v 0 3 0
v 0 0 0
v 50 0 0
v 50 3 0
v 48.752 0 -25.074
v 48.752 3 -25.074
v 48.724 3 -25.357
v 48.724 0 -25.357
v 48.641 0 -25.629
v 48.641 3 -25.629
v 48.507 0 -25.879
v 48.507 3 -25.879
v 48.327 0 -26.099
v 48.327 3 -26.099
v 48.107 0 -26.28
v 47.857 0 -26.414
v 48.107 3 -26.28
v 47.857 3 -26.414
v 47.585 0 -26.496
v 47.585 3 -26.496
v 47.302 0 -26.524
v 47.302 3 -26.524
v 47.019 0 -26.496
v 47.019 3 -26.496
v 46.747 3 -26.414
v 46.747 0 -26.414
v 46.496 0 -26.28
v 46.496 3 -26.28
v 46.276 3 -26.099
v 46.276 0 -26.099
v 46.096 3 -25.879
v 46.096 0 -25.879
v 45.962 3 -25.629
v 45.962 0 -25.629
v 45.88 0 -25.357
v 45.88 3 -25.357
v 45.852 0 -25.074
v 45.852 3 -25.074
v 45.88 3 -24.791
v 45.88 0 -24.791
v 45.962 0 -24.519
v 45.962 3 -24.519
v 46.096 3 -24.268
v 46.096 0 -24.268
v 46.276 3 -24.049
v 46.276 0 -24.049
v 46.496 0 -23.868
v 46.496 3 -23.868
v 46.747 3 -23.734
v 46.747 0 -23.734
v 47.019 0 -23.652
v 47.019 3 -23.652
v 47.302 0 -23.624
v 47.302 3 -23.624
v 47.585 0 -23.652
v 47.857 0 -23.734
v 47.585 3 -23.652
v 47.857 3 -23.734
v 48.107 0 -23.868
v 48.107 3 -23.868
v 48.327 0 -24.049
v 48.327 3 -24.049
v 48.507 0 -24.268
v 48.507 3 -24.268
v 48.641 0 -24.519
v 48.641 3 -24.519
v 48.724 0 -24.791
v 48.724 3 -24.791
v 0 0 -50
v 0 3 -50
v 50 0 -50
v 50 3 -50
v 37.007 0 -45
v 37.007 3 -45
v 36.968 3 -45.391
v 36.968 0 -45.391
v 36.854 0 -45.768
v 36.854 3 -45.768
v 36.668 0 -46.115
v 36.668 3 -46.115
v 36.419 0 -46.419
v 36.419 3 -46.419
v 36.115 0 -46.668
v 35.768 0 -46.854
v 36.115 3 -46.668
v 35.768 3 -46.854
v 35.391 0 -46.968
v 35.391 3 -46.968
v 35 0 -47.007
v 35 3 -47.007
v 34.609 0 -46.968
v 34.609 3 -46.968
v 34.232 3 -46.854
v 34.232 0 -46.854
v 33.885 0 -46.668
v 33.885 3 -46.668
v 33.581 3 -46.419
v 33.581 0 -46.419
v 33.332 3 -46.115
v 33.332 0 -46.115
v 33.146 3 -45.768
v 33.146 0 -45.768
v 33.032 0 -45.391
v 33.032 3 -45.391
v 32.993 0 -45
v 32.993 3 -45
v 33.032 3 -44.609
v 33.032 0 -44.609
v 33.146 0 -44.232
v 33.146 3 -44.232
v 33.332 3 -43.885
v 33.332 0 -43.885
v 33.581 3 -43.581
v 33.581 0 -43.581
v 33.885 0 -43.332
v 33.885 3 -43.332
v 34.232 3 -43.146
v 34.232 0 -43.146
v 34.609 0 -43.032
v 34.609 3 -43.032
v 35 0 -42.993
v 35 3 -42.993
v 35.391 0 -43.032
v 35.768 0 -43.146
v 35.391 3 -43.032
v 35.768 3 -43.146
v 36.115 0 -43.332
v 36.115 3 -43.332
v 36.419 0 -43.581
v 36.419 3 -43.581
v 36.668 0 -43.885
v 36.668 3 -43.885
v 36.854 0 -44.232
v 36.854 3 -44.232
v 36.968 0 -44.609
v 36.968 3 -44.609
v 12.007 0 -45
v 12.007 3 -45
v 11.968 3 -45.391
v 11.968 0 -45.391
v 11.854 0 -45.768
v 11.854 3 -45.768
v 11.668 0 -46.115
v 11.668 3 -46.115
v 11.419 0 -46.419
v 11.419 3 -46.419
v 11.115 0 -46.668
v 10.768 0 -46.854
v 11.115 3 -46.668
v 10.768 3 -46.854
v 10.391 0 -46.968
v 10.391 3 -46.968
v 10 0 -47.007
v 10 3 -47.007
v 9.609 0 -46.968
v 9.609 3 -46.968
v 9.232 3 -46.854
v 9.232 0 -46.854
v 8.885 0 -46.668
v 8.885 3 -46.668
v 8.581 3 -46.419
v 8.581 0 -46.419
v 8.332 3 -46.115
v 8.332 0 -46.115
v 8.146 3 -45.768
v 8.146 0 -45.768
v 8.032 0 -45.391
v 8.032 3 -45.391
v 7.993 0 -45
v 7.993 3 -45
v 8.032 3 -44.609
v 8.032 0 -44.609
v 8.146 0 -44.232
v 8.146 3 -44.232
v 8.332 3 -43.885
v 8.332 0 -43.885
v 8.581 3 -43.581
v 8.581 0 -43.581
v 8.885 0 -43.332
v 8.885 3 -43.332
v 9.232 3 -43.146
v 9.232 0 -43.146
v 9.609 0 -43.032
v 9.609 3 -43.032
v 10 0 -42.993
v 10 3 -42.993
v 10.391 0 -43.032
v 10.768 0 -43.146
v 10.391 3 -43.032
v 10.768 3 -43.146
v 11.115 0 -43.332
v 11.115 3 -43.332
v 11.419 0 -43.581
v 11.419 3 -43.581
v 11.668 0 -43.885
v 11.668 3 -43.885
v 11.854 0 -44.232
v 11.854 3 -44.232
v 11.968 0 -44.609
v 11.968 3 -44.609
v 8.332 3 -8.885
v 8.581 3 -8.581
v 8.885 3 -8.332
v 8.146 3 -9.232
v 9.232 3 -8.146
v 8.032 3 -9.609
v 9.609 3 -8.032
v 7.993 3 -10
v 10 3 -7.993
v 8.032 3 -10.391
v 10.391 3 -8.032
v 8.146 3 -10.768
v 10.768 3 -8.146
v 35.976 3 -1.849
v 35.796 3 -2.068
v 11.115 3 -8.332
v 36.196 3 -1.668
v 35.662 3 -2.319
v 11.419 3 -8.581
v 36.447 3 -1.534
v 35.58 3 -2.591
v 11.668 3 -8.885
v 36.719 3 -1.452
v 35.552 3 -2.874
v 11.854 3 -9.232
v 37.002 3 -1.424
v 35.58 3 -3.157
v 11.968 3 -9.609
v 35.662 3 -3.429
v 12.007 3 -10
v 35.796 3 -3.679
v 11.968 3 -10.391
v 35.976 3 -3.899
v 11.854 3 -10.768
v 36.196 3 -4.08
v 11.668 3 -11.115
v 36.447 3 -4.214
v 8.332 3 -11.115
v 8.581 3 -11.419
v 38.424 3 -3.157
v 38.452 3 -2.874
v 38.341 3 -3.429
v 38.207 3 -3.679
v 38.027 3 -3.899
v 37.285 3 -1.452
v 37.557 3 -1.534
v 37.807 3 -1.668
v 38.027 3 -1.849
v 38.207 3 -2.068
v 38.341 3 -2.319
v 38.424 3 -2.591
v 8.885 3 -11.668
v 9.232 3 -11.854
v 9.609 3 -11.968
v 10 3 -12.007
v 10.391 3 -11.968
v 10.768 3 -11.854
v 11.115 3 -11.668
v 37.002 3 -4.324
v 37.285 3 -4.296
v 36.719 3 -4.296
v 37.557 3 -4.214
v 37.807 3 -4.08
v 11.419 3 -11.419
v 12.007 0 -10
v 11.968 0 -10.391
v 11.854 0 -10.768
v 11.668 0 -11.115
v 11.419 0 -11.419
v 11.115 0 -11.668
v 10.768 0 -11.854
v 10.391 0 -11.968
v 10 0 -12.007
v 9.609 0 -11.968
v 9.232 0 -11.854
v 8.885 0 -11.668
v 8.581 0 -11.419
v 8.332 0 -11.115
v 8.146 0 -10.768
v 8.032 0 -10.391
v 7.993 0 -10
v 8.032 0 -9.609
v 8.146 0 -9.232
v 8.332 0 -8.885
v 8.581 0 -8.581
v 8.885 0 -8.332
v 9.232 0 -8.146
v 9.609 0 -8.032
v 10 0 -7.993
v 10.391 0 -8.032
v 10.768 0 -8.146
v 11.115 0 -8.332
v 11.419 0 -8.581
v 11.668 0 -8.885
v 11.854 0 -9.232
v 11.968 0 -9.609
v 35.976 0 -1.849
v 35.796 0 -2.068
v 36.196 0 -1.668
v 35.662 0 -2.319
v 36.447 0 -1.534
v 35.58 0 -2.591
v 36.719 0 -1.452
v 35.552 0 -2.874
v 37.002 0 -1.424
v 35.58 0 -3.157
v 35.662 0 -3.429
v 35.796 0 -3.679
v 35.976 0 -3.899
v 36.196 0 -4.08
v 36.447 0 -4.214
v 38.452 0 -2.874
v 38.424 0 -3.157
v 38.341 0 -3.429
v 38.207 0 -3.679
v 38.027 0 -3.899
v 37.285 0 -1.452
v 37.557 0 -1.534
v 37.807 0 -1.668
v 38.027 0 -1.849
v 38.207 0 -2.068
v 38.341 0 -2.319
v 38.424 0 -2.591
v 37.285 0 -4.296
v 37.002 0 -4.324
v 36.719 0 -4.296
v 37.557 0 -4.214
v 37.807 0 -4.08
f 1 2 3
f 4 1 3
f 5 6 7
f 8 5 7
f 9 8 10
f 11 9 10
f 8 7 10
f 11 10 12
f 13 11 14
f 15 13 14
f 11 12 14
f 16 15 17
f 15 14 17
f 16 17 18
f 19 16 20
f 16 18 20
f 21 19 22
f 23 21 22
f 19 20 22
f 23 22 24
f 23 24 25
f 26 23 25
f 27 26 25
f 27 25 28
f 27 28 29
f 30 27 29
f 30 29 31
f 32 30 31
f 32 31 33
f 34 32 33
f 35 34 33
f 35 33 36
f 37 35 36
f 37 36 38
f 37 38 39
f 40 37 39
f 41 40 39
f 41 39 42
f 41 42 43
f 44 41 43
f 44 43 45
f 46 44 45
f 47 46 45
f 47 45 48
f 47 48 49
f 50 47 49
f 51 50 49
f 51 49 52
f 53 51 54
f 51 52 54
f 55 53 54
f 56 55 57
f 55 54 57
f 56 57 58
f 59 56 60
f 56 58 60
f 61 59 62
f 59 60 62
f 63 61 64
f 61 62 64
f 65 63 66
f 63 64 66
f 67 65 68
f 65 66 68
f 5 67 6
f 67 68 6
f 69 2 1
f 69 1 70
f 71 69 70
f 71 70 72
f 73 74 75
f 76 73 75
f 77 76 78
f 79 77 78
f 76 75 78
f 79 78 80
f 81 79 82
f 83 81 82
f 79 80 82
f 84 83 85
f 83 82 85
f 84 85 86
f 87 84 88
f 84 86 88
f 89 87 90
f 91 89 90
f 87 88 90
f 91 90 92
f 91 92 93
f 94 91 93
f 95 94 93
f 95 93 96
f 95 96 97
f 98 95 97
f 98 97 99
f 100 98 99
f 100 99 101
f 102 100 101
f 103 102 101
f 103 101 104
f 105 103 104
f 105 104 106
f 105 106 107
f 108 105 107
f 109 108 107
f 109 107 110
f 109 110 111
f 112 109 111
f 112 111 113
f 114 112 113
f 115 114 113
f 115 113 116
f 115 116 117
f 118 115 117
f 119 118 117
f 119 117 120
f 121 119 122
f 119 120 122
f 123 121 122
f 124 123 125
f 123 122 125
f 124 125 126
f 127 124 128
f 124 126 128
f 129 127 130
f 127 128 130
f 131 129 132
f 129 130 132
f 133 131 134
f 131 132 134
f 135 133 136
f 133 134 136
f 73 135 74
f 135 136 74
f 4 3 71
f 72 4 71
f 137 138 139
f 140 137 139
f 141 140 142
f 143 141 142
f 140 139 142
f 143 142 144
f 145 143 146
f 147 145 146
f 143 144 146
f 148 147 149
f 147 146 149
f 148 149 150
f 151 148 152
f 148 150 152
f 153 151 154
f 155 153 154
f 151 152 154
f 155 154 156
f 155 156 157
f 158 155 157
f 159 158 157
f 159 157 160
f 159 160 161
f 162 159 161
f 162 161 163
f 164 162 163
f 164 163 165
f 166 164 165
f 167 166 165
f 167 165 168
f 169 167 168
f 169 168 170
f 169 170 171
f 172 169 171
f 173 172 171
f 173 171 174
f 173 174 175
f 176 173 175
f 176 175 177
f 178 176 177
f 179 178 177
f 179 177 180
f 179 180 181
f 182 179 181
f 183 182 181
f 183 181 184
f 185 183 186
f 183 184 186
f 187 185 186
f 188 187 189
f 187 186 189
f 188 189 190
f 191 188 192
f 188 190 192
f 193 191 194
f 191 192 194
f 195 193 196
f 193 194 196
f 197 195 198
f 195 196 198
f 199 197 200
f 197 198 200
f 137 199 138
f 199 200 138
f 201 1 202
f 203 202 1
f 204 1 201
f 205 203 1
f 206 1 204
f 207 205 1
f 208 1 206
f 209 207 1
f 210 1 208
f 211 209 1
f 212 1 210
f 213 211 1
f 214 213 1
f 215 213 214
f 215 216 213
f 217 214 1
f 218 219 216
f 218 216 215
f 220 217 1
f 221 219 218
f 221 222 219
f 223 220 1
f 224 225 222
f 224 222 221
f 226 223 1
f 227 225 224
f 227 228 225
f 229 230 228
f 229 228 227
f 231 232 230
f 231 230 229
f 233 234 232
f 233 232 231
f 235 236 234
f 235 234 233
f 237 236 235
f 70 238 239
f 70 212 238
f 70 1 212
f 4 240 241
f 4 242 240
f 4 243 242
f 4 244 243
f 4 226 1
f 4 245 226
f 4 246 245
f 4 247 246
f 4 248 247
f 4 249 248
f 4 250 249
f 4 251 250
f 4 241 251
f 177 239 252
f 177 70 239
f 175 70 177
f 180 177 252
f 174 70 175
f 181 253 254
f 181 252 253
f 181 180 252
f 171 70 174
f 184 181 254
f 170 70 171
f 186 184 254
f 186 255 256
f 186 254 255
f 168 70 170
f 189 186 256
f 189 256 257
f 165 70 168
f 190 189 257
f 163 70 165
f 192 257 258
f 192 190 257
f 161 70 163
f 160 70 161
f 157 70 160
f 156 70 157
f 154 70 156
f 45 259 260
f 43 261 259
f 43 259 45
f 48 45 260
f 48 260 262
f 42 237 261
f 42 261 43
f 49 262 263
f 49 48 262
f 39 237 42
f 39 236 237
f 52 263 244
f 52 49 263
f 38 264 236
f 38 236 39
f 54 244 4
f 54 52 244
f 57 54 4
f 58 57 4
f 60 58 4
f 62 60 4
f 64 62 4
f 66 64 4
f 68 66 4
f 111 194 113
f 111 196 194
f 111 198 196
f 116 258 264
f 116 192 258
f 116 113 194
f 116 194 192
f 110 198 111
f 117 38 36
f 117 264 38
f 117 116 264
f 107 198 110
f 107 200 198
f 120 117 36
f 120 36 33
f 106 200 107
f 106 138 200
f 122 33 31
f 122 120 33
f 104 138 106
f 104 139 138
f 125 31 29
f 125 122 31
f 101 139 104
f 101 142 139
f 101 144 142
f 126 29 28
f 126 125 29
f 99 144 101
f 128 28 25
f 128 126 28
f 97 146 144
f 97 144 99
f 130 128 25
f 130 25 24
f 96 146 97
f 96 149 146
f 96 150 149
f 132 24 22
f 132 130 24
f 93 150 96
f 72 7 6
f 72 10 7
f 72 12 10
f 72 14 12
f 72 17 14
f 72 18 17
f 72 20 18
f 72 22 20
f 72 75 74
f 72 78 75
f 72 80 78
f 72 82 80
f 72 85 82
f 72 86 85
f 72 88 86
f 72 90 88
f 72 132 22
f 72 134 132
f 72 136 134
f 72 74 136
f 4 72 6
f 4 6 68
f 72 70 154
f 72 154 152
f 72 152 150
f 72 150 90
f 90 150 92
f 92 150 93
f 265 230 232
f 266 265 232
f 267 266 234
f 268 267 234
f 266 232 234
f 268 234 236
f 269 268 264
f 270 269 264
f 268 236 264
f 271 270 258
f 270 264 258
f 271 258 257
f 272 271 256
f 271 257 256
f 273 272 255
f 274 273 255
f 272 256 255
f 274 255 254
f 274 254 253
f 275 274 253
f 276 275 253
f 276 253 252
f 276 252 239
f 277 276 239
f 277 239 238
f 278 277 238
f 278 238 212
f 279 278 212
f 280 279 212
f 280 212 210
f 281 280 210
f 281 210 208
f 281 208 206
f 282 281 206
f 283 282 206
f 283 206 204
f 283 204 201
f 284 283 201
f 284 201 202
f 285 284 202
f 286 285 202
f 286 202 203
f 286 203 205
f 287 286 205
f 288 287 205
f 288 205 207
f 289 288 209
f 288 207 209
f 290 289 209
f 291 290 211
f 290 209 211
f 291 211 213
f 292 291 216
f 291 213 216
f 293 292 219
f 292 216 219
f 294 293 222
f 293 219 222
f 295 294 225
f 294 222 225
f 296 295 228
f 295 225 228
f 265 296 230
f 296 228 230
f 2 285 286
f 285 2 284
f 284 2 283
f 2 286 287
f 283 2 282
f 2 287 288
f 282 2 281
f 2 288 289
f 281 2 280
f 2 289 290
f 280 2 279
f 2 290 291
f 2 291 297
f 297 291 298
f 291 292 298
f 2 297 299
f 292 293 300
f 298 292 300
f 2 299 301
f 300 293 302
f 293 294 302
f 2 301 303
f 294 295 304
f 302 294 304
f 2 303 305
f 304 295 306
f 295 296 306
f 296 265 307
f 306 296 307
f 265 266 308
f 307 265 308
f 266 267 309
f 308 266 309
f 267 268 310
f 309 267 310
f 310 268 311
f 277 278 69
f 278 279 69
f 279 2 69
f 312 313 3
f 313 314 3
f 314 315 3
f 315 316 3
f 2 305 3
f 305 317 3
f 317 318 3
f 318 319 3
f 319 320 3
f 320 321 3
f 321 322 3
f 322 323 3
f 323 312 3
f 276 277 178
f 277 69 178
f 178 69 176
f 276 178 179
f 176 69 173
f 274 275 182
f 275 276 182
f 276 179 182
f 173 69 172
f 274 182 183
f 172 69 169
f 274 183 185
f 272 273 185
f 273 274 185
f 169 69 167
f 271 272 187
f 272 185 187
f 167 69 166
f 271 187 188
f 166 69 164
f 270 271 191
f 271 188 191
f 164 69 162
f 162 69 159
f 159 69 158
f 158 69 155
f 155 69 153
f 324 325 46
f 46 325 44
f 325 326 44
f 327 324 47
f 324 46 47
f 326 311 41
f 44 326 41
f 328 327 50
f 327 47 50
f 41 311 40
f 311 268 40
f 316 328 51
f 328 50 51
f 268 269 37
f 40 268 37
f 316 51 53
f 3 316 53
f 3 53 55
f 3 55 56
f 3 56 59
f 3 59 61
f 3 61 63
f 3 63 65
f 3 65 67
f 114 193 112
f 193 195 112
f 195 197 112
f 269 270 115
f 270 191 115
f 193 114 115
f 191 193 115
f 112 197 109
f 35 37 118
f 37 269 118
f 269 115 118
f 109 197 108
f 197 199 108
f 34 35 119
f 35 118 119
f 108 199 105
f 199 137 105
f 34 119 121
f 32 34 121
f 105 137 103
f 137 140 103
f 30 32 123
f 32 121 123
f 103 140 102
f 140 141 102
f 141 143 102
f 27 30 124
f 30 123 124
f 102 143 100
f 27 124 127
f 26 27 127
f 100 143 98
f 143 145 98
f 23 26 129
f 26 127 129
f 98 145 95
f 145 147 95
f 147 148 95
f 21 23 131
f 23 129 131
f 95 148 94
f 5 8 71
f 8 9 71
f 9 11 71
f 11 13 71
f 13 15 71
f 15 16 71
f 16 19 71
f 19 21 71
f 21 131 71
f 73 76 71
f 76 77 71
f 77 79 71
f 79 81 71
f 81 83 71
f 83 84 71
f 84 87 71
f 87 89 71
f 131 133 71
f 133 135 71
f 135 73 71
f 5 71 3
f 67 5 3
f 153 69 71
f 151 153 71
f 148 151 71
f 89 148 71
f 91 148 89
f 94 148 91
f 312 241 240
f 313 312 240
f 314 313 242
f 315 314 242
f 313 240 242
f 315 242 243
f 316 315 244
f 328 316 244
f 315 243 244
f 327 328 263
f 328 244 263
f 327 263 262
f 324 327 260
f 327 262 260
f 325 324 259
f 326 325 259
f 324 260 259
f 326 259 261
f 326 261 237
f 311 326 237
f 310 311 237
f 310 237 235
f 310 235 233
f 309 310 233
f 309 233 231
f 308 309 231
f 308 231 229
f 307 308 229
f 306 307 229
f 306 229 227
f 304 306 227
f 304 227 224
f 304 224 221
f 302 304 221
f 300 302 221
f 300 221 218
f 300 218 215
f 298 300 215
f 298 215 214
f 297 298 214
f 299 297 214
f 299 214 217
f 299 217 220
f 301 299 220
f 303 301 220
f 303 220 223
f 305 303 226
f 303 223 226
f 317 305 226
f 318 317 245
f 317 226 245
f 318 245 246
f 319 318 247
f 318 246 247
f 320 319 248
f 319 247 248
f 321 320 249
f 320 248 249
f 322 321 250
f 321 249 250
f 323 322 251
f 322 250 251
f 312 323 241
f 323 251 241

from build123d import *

# Parameters (mm, degrees)
SKETCH1_W           = 50
SKETCH1_H           = 50
BOSS_EXTRUDE1_DEPTH = 3
SKETCH2_R           = 2.0066
CUT_EXTRUDE1_DEPTH  = 4
CUT_EXTRUDE2_REACH  = 5
SKETCH3_R           = 1.45


with BuildPart() as part:
    # Sketch1 → Boss-Extrude1 (new body)
    with BuildSketch(Plane(origin=(0, 0, 0), x_dir=(1, 0, 0), z_dir=(0, 1, 0))):
        with Locations((25, 25)):
            Rectangle(SKETCH1_W, SKETCH1_H)
    extrude(amount=BOSS_EXTRUDE1_DEPTH)

    # Sketch2 → Cut-Extrude1 (cut, through all)
    with BuildSketch(Plane(origin=(0, 3, 0), x_dir=(1, 0, 0), z_dir=(0, 1, 0))):
        with Locations((10, 45)):
            Circle(SKETCH2_R)
        with Locations((35, 45)):
            Circle(SKETCH2_R)
        with Locations((10, 10)):
            Circle(SKETCH2_R)
    extrude(amount=-CUT_EXTRUDE1_DEPTH, mode=Mode.SUBTRACT)

    # Sketch3 → Cut-Extrude2 (cut, up to next)
    with BuildSketch(Plane(origin=(0, 3, 0), x_dir=(1, 0, 0), z_dir=(0, 1, 0)), mode=Mode.PRIVATE) as cut_extrude2_sk1:
        with Locations((47.301711452, 25.073921106)):
            Circle(SKETCH3_R)
    cut_extrude2_tool1 = extrude(cut_extrude2_sk1.sketch, amount=-CUT_EXTRUDE2_REACH, mode=Mode.PRIVATE) & part.part
    add(cut_extrude2_tool1.solids().sort_by_distance((47.301711, 3, -25.073921))[0], mode=Mode.SUBTRACT)
    # Sketch3 → Cut-Extrude2 (cut, up to next)
    with BuildSketch(Plane(origin=(0, 3, 0), x_dir=(1, 0, 0), z_dir=(0, 1, 0)), mode=Mode.PRIVATE) as cut_extrude2_sk2:
        with Locations((37.001711452, 2.873921106)):
            Circle(SKETCH3_R)
    cut_extrude2_tool2 = extrude(cut_extrude2_sk2.sketch, amount=-CUT_EXTRUDE2_REACH, mode=Mode.PRIVATE) & part.part
    add(cut_extrude2_tool2.solids().sort_by_distance((37.001711, 3, -2.873921))[0], mode=Mode.SUBTRACT)


solid = part.part
